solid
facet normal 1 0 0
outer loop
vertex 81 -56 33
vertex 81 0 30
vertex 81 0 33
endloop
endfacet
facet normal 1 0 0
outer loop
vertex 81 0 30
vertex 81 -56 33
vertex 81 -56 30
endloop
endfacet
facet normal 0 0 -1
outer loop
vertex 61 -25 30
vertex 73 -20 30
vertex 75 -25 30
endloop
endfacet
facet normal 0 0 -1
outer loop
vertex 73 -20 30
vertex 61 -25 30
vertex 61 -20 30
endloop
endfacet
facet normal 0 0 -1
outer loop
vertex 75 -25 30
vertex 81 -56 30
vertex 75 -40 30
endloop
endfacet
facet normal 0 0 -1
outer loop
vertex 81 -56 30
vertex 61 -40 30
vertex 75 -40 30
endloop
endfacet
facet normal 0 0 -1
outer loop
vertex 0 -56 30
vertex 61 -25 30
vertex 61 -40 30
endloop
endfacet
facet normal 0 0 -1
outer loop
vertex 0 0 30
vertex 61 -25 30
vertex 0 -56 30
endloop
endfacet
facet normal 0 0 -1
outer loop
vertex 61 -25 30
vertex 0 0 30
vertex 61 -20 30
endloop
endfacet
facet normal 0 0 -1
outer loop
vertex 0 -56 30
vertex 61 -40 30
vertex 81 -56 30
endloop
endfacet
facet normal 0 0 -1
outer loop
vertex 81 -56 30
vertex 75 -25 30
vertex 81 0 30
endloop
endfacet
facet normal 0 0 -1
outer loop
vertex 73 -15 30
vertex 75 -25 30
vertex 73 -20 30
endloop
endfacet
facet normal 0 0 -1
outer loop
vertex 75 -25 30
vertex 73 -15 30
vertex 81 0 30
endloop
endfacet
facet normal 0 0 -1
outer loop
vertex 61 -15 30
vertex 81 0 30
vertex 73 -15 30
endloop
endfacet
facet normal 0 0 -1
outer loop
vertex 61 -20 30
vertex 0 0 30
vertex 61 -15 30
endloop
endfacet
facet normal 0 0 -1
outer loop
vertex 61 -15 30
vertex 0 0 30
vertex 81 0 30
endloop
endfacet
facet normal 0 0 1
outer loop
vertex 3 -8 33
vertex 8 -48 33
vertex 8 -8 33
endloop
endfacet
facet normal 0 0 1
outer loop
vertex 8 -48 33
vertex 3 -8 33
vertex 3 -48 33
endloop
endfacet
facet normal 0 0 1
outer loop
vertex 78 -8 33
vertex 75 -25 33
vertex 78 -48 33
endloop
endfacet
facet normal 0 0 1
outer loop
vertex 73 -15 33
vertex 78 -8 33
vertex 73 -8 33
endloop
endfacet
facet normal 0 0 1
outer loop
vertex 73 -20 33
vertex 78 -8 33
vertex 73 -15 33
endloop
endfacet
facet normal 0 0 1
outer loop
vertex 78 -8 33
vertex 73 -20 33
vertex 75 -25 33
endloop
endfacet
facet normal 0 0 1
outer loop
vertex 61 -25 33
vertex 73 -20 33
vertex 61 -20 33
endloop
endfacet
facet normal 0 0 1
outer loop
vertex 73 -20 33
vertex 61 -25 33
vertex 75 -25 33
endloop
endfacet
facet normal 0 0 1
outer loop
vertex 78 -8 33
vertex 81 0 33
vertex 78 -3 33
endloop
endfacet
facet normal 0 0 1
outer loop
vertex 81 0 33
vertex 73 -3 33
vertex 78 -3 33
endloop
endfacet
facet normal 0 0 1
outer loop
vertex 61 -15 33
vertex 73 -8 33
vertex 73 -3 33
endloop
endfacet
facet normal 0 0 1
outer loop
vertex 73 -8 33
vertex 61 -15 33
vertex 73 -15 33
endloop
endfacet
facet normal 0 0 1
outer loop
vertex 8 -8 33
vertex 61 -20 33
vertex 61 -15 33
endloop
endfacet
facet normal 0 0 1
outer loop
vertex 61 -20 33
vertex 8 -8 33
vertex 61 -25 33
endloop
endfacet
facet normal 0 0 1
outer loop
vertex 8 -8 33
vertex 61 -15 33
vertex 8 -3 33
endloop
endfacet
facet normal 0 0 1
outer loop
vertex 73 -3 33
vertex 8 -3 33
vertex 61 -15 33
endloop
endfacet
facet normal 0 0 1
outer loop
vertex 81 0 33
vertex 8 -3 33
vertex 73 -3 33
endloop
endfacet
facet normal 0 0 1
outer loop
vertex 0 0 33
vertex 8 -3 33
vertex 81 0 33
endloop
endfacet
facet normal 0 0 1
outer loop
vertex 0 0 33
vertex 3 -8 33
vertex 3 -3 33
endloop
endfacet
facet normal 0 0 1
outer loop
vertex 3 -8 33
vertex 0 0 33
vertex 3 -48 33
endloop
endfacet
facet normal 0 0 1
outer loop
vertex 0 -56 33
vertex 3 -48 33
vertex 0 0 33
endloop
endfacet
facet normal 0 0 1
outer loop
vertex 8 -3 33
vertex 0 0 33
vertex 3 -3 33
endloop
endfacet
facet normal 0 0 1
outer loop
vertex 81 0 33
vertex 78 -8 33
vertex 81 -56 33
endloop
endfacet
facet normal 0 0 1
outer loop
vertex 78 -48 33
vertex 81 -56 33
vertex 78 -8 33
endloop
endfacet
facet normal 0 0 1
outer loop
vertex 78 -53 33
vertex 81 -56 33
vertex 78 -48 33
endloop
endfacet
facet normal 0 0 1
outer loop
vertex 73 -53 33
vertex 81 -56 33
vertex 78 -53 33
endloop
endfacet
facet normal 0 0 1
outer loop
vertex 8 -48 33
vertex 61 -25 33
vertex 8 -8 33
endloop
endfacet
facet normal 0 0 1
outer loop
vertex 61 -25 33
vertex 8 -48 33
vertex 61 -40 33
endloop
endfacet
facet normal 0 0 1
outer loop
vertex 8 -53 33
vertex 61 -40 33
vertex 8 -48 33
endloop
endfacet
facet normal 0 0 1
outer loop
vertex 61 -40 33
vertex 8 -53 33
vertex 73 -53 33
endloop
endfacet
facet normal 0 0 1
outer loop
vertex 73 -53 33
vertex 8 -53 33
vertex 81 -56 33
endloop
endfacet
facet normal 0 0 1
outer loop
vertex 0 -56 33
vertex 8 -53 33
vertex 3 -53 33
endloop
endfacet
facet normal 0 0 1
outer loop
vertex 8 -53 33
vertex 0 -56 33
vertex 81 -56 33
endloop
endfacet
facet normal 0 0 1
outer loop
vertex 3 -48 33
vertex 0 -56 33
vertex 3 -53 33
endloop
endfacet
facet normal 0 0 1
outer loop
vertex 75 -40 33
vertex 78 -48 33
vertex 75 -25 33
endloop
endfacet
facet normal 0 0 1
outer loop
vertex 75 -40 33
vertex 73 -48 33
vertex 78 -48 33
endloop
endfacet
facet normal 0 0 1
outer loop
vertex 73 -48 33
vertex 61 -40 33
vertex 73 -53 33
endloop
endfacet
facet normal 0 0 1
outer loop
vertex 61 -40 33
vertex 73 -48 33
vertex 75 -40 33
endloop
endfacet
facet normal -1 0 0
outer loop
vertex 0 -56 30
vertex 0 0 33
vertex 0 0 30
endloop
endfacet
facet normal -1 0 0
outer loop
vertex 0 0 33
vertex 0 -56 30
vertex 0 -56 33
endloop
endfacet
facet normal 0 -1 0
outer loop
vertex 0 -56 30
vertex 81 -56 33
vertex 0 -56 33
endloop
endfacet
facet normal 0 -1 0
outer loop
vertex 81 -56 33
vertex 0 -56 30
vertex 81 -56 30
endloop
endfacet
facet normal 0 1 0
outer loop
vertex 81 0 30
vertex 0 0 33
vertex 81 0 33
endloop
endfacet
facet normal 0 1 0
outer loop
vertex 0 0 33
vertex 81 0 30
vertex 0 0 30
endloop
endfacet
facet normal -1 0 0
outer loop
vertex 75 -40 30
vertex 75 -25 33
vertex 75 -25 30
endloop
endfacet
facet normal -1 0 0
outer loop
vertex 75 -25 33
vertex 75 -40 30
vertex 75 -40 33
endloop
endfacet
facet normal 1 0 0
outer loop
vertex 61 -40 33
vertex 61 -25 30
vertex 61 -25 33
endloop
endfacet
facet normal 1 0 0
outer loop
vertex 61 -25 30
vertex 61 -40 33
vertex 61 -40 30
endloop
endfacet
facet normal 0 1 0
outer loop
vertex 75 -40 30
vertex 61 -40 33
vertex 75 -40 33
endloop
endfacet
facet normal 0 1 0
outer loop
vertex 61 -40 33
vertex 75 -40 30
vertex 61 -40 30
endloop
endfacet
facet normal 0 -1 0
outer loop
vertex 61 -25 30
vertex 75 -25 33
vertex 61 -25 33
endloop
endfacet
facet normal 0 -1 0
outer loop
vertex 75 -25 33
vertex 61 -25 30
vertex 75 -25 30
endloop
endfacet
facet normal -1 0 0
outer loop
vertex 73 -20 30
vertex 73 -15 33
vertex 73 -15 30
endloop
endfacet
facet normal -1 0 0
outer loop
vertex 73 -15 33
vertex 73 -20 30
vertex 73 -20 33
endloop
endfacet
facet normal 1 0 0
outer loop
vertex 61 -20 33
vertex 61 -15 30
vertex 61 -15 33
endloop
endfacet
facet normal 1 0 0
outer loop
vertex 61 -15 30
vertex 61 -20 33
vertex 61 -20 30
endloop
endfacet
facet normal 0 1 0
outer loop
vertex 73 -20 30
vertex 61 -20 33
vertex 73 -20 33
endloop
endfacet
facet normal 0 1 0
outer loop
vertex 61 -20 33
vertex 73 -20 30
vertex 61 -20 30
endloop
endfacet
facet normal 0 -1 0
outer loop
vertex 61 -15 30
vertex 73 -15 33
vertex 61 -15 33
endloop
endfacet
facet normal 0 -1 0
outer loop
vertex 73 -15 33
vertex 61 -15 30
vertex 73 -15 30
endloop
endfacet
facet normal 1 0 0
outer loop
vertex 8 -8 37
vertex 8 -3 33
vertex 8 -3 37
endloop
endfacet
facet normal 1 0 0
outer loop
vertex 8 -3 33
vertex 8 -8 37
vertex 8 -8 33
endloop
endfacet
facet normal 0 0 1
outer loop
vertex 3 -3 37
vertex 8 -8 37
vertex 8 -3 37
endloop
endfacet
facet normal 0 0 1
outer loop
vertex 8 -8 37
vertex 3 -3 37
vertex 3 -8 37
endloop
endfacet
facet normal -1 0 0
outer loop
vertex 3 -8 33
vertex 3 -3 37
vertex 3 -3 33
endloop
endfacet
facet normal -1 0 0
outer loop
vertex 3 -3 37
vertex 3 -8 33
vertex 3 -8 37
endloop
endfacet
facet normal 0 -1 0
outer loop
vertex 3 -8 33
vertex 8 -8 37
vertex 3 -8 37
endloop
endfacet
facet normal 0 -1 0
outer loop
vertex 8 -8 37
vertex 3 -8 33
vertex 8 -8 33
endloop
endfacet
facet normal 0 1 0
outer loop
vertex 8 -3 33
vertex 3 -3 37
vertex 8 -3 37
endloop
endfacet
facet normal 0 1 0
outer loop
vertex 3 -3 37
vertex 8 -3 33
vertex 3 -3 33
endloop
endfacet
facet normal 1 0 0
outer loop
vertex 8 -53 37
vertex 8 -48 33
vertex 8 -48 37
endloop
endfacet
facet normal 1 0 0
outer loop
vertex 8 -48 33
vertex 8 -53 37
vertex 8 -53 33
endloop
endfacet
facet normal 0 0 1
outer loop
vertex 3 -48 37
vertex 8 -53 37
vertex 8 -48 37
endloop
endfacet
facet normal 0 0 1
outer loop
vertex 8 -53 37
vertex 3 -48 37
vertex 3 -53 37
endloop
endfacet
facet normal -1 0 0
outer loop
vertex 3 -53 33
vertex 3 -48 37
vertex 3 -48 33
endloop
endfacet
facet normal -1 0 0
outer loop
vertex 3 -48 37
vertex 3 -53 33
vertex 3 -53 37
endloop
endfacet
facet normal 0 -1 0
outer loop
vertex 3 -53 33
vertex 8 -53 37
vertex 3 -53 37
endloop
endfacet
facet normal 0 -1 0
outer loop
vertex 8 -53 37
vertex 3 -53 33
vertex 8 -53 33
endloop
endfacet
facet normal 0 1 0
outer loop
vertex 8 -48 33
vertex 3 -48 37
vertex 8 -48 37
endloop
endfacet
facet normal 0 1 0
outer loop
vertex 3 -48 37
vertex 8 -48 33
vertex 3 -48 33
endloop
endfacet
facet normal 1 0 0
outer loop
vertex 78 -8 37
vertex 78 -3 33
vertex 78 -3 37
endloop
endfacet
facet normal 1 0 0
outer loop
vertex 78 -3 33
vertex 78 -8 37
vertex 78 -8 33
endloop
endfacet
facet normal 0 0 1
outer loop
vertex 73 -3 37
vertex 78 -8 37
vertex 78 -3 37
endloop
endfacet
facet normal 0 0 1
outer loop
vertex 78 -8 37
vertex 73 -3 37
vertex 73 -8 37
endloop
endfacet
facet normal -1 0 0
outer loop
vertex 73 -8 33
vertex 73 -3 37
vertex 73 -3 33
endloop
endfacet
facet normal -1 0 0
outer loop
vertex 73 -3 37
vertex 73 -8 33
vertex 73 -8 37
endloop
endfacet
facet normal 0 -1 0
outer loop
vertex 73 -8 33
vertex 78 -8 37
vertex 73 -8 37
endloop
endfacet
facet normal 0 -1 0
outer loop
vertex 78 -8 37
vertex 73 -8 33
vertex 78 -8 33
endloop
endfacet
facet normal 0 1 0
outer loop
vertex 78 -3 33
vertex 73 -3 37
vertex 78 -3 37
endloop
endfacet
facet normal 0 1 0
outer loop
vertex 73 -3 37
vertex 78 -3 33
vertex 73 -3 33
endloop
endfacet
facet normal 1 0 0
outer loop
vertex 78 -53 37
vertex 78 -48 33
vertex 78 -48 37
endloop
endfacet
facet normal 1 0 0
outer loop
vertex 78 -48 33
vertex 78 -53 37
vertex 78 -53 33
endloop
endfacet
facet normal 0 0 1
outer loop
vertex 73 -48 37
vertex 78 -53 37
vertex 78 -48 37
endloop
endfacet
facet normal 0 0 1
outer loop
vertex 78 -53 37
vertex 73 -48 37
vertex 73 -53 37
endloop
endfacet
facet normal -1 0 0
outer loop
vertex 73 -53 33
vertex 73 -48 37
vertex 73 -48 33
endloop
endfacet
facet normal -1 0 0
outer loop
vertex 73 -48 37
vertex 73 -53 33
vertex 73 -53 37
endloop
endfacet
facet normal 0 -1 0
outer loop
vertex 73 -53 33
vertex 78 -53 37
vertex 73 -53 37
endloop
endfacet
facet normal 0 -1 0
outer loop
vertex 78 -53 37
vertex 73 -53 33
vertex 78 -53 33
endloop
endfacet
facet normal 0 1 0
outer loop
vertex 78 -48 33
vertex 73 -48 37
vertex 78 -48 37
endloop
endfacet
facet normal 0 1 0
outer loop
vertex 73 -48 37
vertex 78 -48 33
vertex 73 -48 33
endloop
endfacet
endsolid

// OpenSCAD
//!OpenSCAD

quality=128;
tubeHeight = 10;     //20
baseThickness =5;   // 5

//=======================
module boltHole(){
    cylinder(h=20,d=3.6,$fn=quality);
}

//=======================
module fixings(){
    translate([7,7,-1]){
        boltHole();
    }

    translate([7,48,-1]){
        boltHole();
    }
    
    //USB
    translate([-1,25,10]){
        cube([8,11,8]);
    }
    
    //12v power
    translate([-1,15,20]){
        rotate([0,90,0]){
            cylinder(h=10,d=6,$fn=quality);
        }
    }

}


//=======================
module Lid(){

    difference(){
        cube([81,56,3]);
        // hole for heatsink
        translate([61,25,-1]){
            cube([14,15,6]);
        }
        // hole for motor cable
        translate([61,15,-1]){
            cube([12,5,6]);
        }
        
    }
    //corner blocks
    translate([3,3,-4]){
        cube([5,5,5]);
    }
    translate([3,48,-4]){
        cube([5,5,5]);
    }
    translate([73,3,-4]){
        cube([5,5,5]);
    }
    translate([73,48,-4]){
        cube([5,5,5]);
    }


}

//=======================
module Base(){
    difference(){
        cube([81,56,30]);
        translate([3,3,3]){
            cube([75,50,40]);
        }

    }
    //corner ledges
    //bottom left
    translate([3,3,3]){
        cube([8,8,5]);
    }
    //top left
    translate([3,44,3]){
        cube([8,8,5]);
    }
    //bottom right
    translate([73,18,3]){
        cube([5,5,5]);
    }
    //top right
    translate([73,41,3]){
        cube([5,5,5]);
    }
     
}

printRotation = 180;
// ---------- Lid ----------
translate([0,0,33]){
    rotate([printRotation,0,0]){
        Lid();
    }
}


// ---------- Base part ----------
/*
difference(){
    Base();
    fixings();
}
*/
